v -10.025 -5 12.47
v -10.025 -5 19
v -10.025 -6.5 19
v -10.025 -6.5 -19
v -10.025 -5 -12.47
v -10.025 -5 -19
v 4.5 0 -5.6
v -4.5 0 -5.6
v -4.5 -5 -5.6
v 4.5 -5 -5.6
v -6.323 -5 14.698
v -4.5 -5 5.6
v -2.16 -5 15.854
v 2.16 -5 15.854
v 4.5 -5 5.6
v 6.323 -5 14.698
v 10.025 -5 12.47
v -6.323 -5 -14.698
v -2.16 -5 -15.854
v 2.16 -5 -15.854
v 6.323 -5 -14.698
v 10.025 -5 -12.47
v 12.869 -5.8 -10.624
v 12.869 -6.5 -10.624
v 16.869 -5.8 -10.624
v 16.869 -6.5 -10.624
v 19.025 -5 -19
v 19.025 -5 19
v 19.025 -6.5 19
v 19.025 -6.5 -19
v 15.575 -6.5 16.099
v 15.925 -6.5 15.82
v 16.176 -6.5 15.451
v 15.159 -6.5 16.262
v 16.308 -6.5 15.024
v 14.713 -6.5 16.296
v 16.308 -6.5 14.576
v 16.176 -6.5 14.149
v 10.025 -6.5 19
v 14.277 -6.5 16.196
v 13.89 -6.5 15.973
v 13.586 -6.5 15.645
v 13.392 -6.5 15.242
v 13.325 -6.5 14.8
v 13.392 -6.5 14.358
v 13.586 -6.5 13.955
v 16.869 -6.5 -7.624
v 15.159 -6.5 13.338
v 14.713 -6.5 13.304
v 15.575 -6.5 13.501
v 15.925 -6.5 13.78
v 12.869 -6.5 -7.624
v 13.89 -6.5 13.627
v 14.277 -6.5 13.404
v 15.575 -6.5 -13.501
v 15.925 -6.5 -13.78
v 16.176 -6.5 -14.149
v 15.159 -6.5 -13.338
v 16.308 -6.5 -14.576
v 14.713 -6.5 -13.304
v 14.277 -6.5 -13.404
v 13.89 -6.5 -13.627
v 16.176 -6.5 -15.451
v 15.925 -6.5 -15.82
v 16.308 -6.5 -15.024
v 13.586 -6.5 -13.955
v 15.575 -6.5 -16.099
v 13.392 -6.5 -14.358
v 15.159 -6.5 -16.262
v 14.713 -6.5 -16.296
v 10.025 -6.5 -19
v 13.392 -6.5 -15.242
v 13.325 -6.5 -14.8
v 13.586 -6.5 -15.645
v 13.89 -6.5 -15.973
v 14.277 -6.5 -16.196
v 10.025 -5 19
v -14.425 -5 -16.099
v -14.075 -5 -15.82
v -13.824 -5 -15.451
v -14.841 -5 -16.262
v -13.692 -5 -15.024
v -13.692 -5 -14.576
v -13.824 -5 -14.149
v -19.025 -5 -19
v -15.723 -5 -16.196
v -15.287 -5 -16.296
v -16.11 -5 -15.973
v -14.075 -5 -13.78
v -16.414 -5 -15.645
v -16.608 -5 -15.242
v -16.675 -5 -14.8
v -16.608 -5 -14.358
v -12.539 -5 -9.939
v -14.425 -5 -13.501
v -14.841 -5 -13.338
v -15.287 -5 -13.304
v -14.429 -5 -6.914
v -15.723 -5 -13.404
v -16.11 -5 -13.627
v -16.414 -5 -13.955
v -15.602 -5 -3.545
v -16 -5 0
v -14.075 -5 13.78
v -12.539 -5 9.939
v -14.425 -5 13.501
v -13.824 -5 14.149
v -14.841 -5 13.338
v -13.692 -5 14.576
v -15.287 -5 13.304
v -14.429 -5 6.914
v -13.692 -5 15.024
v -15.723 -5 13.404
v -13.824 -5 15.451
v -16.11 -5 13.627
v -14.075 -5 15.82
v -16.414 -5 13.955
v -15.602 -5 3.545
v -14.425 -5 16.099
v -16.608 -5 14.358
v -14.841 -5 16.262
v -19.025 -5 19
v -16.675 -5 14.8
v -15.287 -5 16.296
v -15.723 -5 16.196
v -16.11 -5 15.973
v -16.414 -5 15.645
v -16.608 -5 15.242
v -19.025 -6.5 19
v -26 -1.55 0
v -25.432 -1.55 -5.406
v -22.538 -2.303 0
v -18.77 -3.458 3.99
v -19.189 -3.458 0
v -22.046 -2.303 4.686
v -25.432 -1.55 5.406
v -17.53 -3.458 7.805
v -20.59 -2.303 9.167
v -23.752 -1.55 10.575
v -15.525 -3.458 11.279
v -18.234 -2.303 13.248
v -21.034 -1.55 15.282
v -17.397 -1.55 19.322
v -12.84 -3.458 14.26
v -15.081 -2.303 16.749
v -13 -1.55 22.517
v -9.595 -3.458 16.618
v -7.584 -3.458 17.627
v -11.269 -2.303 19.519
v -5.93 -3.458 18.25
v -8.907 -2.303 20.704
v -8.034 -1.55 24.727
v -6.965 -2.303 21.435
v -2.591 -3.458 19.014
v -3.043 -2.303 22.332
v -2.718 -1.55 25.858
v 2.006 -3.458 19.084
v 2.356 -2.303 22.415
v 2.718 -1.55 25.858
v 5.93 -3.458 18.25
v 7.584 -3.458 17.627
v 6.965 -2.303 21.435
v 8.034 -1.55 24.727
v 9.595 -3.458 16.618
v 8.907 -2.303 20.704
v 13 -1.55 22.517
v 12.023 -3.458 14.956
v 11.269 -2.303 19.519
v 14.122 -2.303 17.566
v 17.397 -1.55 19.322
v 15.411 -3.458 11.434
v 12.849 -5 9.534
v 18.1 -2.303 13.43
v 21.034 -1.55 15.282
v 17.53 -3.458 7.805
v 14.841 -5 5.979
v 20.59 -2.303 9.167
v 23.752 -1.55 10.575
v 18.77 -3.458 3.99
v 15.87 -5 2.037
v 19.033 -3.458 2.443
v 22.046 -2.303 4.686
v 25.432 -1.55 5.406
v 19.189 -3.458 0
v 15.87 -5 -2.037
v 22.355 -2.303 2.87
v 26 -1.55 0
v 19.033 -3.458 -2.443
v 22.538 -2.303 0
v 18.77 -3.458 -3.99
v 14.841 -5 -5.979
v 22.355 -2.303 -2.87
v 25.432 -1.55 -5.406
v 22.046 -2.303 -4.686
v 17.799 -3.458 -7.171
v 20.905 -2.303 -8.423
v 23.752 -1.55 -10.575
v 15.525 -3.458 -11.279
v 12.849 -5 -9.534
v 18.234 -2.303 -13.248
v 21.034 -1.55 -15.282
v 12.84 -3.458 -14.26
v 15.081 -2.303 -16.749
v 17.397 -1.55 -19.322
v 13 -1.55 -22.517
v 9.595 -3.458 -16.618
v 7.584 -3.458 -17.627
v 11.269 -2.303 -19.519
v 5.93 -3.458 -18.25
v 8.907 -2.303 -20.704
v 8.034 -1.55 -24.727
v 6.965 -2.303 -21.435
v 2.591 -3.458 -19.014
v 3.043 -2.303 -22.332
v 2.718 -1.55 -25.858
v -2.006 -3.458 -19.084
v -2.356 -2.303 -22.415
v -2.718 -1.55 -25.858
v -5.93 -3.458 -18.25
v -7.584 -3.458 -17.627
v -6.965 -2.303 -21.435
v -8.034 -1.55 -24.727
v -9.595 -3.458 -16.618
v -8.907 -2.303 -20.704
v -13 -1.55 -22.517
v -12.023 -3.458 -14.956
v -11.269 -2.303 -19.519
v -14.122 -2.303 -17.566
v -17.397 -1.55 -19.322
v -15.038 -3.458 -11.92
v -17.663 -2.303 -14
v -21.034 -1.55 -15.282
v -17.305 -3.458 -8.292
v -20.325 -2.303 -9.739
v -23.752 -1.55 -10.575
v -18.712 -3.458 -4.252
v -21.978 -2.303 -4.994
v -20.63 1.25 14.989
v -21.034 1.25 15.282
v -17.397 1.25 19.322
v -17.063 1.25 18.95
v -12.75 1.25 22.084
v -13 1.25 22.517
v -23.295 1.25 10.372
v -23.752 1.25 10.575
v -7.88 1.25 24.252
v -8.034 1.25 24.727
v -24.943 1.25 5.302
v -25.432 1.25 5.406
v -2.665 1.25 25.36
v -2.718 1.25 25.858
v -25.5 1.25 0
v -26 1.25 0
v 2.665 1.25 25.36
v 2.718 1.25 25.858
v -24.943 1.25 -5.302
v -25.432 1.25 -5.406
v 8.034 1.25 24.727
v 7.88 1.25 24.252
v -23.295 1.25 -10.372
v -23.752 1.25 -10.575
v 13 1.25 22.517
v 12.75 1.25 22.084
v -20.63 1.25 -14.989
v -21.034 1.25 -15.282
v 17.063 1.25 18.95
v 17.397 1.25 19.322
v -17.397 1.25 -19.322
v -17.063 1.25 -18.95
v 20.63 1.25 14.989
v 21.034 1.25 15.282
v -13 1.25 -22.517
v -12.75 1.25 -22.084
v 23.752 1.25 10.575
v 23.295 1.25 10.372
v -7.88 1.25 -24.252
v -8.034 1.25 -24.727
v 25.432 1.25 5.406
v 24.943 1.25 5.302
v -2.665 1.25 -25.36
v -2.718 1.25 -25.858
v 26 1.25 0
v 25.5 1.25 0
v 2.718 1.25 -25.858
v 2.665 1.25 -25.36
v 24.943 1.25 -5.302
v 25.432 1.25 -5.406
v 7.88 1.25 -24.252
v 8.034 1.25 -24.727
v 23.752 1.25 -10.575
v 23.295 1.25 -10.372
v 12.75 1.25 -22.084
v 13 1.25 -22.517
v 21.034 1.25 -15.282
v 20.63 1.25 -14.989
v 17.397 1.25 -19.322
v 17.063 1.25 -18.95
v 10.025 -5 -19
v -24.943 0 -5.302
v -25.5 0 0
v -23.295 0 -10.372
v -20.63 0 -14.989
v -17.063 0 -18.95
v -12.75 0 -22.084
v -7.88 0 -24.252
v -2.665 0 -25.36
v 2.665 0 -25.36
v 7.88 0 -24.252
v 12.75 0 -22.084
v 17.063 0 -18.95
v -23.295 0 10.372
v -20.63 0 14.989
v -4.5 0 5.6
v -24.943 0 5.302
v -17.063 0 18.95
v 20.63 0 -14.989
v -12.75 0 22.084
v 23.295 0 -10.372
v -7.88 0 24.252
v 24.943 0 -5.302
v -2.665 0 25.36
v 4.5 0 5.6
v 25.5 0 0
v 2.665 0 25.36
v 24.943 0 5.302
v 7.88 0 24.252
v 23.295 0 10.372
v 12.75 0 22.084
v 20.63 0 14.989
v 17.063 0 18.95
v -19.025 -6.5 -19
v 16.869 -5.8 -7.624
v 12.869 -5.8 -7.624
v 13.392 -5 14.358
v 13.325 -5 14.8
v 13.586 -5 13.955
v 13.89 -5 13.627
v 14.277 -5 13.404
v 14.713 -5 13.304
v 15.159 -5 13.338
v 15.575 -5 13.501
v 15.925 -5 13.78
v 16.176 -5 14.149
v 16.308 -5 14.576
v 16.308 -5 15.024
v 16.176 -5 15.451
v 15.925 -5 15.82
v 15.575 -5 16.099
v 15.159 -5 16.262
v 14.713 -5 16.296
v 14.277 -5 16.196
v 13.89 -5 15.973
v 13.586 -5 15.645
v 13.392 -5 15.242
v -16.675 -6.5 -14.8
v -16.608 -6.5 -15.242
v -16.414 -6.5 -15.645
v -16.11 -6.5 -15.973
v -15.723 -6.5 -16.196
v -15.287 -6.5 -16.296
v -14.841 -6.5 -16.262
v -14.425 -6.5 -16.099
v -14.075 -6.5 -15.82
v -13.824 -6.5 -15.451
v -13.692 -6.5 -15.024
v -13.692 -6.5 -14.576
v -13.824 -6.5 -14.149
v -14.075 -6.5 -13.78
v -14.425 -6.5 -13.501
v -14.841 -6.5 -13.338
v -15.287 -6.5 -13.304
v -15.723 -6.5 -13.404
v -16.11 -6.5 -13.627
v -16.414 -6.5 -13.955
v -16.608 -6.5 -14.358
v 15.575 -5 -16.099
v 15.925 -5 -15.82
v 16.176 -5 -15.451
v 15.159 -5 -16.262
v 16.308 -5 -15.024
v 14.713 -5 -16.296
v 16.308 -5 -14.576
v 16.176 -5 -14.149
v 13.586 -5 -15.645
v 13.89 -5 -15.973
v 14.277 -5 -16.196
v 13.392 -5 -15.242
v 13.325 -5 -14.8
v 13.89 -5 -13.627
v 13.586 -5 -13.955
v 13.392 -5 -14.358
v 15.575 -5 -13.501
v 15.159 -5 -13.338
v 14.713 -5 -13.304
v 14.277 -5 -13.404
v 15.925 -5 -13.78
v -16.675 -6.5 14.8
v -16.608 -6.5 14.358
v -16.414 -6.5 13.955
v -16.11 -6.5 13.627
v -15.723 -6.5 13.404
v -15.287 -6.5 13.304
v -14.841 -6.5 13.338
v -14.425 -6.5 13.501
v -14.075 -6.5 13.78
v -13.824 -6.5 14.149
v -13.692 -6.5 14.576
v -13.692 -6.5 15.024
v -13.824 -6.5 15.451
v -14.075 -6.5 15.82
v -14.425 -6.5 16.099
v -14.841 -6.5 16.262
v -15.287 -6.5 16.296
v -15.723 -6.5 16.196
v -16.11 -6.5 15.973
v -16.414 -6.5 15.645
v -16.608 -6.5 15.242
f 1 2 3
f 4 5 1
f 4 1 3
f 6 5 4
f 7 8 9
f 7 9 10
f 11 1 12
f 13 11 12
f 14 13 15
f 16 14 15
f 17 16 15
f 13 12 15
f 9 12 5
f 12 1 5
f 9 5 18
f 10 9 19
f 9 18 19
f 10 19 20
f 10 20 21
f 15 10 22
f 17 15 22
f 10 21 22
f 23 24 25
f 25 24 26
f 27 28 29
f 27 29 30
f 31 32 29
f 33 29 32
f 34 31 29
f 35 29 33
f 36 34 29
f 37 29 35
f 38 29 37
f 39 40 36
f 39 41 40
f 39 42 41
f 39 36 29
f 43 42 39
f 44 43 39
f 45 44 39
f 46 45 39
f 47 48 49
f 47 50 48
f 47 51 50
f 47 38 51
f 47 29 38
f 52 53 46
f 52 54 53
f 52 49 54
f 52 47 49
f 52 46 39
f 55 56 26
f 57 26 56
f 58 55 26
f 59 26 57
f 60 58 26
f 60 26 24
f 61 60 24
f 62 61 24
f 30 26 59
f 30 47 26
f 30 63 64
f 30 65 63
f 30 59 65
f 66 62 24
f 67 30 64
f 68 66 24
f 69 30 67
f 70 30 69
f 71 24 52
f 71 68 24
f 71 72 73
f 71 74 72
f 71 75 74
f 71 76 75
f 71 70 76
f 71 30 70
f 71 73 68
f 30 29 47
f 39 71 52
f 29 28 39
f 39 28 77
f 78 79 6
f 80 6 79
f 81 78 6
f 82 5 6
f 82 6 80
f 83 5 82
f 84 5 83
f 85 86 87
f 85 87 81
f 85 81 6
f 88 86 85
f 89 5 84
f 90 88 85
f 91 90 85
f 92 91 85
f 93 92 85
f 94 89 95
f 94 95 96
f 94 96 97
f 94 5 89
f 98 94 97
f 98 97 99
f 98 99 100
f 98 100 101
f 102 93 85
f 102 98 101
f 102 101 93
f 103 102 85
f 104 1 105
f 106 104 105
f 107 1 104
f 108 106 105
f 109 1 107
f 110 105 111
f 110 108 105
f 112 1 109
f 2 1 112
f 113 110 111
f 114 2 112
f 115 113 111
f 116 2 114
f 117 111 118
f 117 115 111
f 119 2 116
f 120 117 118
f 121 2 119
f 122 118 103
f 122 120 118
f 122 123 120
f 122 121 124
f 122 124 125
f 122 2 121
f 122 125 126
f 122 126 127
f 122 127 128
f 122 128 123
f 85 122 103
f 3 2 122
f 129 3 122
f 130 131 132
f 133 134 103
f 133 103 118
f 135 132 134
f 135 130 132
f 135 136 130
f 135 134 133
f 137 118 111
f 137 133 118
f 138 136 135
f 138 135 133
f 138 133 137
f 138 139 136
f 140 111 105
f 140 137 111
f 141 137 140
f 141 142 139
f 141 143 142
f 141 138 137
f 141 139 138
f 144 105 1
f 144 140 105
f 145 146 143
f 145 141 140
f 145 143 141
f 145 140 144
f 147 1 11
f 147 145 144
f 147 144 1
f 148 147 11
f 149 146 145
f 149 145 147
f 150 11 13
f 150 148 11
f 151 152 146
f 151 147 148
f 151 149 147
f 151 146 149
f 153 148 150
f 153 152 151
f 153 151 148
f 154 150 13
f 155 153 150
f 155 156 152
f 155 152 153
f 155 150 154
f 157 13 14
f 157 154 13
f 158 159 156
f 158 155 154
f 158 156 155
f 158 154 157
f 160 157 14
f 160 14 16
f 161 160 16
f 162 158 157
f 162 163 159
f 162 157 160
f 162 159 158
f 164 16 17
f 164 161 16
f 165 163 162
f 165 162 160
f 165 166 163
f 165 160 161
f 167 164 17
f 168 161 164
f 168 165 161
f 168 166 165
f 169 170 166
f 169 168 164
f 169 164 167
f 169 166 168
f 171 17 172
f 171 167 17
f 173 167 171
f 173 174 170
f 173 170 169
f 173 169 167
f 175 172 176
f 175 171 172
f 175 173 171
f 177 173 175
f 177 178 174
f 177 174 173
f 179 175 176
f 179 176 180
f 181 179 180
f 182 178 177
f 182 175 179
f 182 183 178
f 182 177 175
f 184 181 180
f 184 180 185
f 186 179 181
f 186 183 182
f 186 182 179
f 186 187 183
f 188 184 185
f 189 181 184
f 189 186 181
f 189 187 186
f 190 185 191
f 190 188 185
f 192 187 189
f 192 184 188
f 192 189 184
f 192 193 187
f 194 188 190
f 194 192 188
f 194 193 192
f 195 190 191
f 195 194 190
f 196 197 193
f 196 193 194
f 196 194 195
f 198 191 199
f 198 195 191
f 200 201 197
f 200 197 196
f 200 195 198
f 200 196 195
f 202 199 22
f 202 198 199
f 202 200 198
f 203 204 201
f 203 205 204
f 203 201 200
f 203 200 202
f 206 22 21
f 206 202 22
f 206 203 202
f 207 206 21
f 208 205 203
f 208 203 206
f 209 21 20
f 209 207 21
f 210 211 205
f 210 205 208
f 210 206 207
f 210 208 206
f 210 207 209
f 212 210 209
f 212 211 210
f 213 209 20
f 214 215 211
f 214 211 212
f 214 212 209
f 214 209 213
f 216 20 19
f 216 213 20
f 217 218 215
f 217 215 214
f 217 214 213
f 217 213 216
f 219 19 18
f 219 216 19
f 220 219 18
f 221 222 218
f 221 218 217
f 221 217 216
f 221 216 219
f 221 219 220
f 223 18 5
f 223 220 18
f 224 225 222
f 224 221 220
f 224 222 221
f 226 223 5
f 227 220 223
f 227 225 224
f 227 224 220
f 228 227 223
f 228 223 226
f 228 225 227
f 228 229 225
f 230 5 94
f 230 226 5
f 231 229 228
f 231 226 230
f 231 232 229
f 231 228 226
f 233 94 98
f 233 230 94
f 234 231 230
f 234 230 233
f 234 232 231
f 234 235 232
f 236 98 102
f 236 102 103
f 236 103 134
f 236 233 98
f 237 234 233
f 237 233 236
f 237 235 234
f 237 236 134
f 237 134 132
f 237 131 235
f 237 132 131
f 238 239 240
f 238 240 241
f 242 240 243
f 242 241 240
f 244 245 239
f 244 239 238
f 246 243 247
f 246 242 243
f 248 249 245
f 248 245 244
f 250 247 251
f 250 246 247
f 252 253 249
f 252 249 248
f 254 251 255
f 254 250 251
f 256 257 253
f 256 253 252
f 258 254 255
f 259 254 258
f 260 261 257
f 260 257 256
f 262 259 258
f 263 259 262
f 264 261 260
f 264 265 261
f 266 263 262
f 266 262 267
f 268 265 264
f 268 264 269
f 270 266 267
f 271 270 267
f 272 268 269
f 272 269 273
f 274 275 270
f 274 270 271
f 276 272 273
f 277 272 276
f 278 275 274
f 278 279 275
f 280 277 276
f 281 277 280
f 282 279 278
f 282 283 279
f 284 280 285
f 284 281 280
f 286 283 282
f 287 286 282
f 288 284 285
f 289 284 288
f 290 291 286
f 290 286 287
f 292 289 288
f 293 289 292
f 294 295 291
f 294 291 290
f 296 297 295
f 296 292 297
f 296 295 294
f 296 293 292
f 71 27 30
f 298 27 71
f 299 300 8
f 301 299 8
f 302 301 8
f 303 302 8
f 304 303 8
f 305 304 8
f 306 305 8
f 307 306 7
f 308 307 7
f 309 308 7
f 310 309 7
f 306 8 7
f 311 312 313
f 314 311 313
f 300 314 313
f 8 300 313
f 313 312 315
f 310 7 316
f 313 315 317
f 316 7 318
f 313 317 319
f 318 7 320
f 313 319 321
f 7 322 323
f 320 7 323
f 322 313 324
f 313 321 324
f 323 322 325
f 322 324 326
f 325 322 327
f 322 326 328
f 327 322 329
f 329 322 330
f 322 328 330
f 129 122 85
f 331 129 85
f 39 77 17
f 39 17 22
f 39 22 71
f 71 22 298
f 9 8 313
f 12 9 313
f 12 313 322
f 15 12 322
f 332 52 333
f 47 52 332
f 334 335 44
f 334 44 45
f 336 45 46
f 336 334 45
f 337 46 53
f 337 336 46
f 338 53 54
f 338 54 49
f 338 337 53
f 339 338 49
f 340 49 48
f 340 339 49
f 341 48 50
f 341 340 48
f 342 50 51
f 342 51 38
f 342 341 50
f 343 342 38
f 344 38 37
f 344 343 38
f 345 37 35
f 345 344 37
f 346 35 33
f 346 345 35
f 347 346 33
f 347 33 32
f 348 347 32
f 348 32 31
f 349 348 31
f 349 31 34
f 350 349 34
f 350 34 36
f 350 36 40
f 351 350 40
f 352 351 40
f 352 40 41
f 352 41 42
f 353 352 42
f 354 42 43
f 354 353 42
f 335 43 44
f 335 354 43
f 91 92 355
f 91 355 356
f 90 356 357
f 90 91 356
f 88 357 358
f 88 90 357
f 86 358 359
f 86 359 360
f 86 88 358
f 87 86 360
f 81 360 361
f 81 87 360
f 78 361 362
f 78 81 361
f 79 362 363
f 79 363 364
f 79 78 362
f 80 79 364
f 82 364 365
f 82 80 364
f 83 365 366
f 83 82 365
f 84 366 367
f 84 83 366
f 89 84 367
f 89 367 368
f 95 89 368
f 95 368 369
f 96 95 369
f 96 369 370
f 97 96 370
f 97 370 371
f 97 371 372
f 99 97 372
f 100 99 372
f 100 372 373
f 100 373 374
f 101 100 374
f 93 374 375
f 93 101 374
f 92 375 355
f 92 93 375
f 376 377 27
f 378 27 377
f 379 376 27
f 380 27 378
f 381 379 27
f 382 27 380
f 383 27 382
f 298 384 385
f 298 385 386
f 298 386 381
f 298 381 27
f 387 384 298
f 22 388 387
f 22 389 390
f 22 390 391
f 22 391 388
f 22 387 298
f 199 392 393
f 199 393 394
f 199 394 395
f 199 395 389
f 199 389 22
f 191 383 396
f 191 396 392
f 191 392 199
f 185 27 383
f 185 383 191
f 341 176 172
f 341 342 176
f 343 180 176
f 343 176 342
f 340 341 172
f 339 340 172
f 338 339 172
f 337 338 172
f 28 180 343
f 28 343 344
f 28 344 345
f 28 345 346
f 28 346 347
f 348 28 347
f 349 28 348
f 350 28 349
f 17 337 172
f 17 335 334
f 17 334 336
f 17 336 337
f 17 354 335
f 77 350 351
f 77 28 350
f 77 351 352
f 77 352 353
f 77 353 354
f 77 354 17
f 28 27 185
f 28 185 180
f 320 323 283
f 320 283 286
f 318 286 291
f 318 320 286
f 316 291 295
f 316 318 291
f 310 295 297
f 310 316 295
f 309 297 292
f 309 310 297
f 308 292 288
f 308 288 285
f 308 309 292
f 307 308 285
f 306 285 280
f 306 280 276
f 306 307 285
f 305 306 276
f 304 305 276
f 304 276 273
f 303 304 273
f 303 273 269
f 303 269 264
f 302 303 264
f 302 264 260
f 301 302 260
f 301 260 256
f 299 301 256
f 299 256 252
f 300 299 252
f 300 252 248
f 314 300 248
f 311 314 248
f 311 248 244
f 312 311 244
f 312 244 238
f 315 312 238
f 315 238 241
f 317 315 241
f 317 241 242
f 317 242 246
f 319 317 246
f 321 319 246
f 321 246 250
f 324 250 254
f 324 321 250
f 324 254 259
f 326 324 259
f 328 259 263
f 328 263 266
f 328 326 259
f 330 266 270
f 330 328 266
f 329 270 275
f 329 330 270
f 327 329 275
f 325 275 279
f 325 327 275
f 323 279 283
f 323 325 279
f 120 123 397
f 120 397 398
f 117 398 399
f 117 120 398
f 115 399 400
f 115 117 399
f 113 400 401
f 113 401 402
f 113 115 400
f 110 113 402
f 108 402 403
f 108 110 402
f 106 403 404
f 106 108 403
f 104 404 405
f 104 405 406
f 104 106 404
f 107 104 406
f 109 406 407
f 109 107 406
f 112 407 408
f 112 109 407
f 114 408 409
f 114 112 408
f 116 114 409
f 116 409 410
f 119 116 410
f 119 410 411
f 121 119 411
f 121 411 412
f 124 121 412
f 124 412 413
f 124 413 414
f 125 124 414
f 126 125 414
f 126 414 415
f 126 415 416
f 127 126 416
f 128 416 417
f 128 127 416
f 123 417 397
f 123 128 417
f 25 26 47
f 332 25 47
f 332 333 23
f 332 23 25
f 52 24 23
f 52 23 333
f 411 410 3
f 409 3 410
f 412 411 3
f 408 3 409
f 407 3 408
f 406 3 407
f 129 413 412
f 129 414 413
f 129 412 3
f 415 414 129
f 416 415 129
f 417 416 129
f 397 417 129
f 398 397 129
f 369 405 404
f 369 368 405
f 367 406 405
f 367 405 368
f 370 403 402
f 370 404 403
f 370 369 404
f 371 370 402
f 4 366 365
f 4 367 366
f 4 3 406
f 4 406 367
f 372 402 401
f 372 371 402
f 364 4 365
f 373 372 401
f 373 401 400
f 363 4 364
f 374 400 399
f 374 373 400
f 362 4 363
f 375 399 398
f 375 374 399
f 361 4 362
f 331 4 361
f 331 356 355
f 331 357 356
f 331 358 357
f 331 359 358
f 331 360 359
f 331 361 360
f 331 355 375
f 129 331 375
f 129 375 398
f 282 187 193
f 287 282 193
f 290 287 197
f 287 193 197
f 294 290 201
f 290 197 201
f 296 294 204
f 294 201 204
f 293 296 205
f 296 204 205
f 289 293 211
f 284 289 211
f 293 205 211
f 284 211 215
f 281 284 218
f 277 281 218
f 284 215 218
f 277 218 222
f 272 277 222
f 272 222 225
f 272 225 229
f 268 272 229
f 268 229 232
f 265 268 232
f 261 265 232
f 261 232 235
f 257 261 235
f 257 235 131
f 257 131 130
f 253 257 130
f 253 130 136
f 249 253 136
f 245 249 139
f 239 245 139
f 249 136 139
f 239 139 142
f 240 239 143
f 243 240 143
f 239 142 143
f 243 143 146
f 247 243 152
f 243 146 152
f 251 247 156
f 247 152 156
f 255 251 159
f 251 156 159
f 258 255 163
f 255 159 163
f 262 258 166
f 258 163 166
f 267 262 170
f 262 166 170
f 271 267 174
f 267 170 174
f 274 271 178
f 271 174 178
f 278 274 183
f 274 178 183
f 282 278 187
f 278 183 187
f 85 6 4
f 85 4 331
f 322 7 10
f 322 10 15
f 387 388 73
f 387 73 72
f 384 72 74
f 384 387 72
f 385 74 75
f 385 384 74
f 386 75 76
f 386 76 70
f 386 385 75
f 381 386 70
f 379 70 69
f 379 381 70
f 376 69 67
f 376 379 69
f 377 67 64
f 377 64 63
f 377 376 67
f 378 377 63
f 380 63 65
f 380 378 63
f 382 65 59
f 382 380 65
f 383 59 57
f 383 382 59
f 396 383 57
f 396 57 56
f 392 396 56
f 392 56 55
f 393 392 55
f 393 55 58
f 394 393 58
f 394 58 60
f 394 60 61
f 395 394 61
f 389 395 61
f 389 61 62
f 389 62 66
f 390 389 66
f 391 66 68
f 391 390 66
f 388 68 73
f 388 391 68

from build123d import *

# Parameters (mm, degrees)
SKETCH7_R             = 25.5
SKETCH7_W             = 9
SKETCH7_H             = 11.2
LENS_SPACER_DEPTH     = 5
SKETCH5_W             = 9
SKETCH5_H             = 38
SKETCH5_R             = 1.5
ATTACHMENT_LEGS_DEPTH = 1.5
LENS_START            = -5
SKETCH8_R             = 26
SKETCH8_R_2           = 25.5
LENS_POSITIONER_DEPTH = 6.25
SKETCH11_W            = 4
SKETCH11_H            = 3
NODE_HOLE_DEPTH       = 0.7


with BuildPart() as part:
    # Sketch7 → Lens Spacer (new body)
    with BuildSketch(Plane.XZ):
        Circle(SKETCH7_R)
        Rectangle(SKETCH7_W, SKETCH7_H, mode=Mode.SUBTRACT)
    extrude(amount=LENS_SPACER_DEPTH)

    # Sketch5 → Attachment Legs (add)
    with BuildSketch(Plane(origin=(0, -5, 0), x_dir=(-1, 0, 0), z_dir=(0, -1, 0))):
        with Locations((-14.525, 0)):
            Rectangle(SKETCH5_W, SKETCH5_H)
        with Locations((-14.825, 14.8)):
            Circle(SKETCH5_R, mode=Mode.SUBTRACT)
        with Locations((-14.825, -14.8)):
            Circle(SKETCH5_R, mode=Mode.SUBTRACT)
        with Locations((14.525, 0)):
            Rectangle(SKETCH5_W, SKETCH5_H)
        with Locations((15.175, -14.8)):
            Circle(SKETCH5_R, mode=Mode.SUBTRACT)
        with Locations((15.175, 14.8)):
            Circle(SKETCH5_R, mode=Mode.SUBTRACT)
    extrude(amount=ATTACHMENT_LEGS_DEPTH)

    # Sketch8 → Lens Positioner (add)
    with BuildSketch(Plane(origin=(0, 0, 0), x_dir=(1, 0, 0), z_dir=(0, 1, 0)).offset(LENS_START)):
        Circle(SKETCH8_R)
        Circle(SKETCH8_R_2, mode=Mode.SUBTRACT)
    extrude(amount=LENS_POSITIONER_DEPTH)

    # Sketch11 → Node Hole (cut)
    with BuildSketch(Plane.XZ.offset(6.5)):
        with Locations((14.868591599, -9.123908481)):
            Rectangle(SKETCH11_W, SKETCH11_H)
    extrude(amount=-NODE_HOLE_DEPTH, mode=Mode.SUBTRACT)

    # Sketch13 → Cut-Revolve1 (revolve, cut)
    with BuildSketch(Plane.XY):
        with BuildLine():
            ThreePointArc((-16, -5), (-20.846735107, -2.830753933), (-26, -1.55))
            Line((-26, -1.55), (-26, -5))
            Line((-26, -5), (-16, -5))
        make_face()
        with BuildLine():
            Line((-23.315412737, -5), (-16, -5))
            ThreePointArc((-16, -5), (-19.657706368, -4.047609039), (-23.315412737, -5))
        make_face()
    revolve(axis=Axis((0, -78.539105243, 0), (0, 1, 0)), mode=Mode.SUBTRACT)


solid = part.part
